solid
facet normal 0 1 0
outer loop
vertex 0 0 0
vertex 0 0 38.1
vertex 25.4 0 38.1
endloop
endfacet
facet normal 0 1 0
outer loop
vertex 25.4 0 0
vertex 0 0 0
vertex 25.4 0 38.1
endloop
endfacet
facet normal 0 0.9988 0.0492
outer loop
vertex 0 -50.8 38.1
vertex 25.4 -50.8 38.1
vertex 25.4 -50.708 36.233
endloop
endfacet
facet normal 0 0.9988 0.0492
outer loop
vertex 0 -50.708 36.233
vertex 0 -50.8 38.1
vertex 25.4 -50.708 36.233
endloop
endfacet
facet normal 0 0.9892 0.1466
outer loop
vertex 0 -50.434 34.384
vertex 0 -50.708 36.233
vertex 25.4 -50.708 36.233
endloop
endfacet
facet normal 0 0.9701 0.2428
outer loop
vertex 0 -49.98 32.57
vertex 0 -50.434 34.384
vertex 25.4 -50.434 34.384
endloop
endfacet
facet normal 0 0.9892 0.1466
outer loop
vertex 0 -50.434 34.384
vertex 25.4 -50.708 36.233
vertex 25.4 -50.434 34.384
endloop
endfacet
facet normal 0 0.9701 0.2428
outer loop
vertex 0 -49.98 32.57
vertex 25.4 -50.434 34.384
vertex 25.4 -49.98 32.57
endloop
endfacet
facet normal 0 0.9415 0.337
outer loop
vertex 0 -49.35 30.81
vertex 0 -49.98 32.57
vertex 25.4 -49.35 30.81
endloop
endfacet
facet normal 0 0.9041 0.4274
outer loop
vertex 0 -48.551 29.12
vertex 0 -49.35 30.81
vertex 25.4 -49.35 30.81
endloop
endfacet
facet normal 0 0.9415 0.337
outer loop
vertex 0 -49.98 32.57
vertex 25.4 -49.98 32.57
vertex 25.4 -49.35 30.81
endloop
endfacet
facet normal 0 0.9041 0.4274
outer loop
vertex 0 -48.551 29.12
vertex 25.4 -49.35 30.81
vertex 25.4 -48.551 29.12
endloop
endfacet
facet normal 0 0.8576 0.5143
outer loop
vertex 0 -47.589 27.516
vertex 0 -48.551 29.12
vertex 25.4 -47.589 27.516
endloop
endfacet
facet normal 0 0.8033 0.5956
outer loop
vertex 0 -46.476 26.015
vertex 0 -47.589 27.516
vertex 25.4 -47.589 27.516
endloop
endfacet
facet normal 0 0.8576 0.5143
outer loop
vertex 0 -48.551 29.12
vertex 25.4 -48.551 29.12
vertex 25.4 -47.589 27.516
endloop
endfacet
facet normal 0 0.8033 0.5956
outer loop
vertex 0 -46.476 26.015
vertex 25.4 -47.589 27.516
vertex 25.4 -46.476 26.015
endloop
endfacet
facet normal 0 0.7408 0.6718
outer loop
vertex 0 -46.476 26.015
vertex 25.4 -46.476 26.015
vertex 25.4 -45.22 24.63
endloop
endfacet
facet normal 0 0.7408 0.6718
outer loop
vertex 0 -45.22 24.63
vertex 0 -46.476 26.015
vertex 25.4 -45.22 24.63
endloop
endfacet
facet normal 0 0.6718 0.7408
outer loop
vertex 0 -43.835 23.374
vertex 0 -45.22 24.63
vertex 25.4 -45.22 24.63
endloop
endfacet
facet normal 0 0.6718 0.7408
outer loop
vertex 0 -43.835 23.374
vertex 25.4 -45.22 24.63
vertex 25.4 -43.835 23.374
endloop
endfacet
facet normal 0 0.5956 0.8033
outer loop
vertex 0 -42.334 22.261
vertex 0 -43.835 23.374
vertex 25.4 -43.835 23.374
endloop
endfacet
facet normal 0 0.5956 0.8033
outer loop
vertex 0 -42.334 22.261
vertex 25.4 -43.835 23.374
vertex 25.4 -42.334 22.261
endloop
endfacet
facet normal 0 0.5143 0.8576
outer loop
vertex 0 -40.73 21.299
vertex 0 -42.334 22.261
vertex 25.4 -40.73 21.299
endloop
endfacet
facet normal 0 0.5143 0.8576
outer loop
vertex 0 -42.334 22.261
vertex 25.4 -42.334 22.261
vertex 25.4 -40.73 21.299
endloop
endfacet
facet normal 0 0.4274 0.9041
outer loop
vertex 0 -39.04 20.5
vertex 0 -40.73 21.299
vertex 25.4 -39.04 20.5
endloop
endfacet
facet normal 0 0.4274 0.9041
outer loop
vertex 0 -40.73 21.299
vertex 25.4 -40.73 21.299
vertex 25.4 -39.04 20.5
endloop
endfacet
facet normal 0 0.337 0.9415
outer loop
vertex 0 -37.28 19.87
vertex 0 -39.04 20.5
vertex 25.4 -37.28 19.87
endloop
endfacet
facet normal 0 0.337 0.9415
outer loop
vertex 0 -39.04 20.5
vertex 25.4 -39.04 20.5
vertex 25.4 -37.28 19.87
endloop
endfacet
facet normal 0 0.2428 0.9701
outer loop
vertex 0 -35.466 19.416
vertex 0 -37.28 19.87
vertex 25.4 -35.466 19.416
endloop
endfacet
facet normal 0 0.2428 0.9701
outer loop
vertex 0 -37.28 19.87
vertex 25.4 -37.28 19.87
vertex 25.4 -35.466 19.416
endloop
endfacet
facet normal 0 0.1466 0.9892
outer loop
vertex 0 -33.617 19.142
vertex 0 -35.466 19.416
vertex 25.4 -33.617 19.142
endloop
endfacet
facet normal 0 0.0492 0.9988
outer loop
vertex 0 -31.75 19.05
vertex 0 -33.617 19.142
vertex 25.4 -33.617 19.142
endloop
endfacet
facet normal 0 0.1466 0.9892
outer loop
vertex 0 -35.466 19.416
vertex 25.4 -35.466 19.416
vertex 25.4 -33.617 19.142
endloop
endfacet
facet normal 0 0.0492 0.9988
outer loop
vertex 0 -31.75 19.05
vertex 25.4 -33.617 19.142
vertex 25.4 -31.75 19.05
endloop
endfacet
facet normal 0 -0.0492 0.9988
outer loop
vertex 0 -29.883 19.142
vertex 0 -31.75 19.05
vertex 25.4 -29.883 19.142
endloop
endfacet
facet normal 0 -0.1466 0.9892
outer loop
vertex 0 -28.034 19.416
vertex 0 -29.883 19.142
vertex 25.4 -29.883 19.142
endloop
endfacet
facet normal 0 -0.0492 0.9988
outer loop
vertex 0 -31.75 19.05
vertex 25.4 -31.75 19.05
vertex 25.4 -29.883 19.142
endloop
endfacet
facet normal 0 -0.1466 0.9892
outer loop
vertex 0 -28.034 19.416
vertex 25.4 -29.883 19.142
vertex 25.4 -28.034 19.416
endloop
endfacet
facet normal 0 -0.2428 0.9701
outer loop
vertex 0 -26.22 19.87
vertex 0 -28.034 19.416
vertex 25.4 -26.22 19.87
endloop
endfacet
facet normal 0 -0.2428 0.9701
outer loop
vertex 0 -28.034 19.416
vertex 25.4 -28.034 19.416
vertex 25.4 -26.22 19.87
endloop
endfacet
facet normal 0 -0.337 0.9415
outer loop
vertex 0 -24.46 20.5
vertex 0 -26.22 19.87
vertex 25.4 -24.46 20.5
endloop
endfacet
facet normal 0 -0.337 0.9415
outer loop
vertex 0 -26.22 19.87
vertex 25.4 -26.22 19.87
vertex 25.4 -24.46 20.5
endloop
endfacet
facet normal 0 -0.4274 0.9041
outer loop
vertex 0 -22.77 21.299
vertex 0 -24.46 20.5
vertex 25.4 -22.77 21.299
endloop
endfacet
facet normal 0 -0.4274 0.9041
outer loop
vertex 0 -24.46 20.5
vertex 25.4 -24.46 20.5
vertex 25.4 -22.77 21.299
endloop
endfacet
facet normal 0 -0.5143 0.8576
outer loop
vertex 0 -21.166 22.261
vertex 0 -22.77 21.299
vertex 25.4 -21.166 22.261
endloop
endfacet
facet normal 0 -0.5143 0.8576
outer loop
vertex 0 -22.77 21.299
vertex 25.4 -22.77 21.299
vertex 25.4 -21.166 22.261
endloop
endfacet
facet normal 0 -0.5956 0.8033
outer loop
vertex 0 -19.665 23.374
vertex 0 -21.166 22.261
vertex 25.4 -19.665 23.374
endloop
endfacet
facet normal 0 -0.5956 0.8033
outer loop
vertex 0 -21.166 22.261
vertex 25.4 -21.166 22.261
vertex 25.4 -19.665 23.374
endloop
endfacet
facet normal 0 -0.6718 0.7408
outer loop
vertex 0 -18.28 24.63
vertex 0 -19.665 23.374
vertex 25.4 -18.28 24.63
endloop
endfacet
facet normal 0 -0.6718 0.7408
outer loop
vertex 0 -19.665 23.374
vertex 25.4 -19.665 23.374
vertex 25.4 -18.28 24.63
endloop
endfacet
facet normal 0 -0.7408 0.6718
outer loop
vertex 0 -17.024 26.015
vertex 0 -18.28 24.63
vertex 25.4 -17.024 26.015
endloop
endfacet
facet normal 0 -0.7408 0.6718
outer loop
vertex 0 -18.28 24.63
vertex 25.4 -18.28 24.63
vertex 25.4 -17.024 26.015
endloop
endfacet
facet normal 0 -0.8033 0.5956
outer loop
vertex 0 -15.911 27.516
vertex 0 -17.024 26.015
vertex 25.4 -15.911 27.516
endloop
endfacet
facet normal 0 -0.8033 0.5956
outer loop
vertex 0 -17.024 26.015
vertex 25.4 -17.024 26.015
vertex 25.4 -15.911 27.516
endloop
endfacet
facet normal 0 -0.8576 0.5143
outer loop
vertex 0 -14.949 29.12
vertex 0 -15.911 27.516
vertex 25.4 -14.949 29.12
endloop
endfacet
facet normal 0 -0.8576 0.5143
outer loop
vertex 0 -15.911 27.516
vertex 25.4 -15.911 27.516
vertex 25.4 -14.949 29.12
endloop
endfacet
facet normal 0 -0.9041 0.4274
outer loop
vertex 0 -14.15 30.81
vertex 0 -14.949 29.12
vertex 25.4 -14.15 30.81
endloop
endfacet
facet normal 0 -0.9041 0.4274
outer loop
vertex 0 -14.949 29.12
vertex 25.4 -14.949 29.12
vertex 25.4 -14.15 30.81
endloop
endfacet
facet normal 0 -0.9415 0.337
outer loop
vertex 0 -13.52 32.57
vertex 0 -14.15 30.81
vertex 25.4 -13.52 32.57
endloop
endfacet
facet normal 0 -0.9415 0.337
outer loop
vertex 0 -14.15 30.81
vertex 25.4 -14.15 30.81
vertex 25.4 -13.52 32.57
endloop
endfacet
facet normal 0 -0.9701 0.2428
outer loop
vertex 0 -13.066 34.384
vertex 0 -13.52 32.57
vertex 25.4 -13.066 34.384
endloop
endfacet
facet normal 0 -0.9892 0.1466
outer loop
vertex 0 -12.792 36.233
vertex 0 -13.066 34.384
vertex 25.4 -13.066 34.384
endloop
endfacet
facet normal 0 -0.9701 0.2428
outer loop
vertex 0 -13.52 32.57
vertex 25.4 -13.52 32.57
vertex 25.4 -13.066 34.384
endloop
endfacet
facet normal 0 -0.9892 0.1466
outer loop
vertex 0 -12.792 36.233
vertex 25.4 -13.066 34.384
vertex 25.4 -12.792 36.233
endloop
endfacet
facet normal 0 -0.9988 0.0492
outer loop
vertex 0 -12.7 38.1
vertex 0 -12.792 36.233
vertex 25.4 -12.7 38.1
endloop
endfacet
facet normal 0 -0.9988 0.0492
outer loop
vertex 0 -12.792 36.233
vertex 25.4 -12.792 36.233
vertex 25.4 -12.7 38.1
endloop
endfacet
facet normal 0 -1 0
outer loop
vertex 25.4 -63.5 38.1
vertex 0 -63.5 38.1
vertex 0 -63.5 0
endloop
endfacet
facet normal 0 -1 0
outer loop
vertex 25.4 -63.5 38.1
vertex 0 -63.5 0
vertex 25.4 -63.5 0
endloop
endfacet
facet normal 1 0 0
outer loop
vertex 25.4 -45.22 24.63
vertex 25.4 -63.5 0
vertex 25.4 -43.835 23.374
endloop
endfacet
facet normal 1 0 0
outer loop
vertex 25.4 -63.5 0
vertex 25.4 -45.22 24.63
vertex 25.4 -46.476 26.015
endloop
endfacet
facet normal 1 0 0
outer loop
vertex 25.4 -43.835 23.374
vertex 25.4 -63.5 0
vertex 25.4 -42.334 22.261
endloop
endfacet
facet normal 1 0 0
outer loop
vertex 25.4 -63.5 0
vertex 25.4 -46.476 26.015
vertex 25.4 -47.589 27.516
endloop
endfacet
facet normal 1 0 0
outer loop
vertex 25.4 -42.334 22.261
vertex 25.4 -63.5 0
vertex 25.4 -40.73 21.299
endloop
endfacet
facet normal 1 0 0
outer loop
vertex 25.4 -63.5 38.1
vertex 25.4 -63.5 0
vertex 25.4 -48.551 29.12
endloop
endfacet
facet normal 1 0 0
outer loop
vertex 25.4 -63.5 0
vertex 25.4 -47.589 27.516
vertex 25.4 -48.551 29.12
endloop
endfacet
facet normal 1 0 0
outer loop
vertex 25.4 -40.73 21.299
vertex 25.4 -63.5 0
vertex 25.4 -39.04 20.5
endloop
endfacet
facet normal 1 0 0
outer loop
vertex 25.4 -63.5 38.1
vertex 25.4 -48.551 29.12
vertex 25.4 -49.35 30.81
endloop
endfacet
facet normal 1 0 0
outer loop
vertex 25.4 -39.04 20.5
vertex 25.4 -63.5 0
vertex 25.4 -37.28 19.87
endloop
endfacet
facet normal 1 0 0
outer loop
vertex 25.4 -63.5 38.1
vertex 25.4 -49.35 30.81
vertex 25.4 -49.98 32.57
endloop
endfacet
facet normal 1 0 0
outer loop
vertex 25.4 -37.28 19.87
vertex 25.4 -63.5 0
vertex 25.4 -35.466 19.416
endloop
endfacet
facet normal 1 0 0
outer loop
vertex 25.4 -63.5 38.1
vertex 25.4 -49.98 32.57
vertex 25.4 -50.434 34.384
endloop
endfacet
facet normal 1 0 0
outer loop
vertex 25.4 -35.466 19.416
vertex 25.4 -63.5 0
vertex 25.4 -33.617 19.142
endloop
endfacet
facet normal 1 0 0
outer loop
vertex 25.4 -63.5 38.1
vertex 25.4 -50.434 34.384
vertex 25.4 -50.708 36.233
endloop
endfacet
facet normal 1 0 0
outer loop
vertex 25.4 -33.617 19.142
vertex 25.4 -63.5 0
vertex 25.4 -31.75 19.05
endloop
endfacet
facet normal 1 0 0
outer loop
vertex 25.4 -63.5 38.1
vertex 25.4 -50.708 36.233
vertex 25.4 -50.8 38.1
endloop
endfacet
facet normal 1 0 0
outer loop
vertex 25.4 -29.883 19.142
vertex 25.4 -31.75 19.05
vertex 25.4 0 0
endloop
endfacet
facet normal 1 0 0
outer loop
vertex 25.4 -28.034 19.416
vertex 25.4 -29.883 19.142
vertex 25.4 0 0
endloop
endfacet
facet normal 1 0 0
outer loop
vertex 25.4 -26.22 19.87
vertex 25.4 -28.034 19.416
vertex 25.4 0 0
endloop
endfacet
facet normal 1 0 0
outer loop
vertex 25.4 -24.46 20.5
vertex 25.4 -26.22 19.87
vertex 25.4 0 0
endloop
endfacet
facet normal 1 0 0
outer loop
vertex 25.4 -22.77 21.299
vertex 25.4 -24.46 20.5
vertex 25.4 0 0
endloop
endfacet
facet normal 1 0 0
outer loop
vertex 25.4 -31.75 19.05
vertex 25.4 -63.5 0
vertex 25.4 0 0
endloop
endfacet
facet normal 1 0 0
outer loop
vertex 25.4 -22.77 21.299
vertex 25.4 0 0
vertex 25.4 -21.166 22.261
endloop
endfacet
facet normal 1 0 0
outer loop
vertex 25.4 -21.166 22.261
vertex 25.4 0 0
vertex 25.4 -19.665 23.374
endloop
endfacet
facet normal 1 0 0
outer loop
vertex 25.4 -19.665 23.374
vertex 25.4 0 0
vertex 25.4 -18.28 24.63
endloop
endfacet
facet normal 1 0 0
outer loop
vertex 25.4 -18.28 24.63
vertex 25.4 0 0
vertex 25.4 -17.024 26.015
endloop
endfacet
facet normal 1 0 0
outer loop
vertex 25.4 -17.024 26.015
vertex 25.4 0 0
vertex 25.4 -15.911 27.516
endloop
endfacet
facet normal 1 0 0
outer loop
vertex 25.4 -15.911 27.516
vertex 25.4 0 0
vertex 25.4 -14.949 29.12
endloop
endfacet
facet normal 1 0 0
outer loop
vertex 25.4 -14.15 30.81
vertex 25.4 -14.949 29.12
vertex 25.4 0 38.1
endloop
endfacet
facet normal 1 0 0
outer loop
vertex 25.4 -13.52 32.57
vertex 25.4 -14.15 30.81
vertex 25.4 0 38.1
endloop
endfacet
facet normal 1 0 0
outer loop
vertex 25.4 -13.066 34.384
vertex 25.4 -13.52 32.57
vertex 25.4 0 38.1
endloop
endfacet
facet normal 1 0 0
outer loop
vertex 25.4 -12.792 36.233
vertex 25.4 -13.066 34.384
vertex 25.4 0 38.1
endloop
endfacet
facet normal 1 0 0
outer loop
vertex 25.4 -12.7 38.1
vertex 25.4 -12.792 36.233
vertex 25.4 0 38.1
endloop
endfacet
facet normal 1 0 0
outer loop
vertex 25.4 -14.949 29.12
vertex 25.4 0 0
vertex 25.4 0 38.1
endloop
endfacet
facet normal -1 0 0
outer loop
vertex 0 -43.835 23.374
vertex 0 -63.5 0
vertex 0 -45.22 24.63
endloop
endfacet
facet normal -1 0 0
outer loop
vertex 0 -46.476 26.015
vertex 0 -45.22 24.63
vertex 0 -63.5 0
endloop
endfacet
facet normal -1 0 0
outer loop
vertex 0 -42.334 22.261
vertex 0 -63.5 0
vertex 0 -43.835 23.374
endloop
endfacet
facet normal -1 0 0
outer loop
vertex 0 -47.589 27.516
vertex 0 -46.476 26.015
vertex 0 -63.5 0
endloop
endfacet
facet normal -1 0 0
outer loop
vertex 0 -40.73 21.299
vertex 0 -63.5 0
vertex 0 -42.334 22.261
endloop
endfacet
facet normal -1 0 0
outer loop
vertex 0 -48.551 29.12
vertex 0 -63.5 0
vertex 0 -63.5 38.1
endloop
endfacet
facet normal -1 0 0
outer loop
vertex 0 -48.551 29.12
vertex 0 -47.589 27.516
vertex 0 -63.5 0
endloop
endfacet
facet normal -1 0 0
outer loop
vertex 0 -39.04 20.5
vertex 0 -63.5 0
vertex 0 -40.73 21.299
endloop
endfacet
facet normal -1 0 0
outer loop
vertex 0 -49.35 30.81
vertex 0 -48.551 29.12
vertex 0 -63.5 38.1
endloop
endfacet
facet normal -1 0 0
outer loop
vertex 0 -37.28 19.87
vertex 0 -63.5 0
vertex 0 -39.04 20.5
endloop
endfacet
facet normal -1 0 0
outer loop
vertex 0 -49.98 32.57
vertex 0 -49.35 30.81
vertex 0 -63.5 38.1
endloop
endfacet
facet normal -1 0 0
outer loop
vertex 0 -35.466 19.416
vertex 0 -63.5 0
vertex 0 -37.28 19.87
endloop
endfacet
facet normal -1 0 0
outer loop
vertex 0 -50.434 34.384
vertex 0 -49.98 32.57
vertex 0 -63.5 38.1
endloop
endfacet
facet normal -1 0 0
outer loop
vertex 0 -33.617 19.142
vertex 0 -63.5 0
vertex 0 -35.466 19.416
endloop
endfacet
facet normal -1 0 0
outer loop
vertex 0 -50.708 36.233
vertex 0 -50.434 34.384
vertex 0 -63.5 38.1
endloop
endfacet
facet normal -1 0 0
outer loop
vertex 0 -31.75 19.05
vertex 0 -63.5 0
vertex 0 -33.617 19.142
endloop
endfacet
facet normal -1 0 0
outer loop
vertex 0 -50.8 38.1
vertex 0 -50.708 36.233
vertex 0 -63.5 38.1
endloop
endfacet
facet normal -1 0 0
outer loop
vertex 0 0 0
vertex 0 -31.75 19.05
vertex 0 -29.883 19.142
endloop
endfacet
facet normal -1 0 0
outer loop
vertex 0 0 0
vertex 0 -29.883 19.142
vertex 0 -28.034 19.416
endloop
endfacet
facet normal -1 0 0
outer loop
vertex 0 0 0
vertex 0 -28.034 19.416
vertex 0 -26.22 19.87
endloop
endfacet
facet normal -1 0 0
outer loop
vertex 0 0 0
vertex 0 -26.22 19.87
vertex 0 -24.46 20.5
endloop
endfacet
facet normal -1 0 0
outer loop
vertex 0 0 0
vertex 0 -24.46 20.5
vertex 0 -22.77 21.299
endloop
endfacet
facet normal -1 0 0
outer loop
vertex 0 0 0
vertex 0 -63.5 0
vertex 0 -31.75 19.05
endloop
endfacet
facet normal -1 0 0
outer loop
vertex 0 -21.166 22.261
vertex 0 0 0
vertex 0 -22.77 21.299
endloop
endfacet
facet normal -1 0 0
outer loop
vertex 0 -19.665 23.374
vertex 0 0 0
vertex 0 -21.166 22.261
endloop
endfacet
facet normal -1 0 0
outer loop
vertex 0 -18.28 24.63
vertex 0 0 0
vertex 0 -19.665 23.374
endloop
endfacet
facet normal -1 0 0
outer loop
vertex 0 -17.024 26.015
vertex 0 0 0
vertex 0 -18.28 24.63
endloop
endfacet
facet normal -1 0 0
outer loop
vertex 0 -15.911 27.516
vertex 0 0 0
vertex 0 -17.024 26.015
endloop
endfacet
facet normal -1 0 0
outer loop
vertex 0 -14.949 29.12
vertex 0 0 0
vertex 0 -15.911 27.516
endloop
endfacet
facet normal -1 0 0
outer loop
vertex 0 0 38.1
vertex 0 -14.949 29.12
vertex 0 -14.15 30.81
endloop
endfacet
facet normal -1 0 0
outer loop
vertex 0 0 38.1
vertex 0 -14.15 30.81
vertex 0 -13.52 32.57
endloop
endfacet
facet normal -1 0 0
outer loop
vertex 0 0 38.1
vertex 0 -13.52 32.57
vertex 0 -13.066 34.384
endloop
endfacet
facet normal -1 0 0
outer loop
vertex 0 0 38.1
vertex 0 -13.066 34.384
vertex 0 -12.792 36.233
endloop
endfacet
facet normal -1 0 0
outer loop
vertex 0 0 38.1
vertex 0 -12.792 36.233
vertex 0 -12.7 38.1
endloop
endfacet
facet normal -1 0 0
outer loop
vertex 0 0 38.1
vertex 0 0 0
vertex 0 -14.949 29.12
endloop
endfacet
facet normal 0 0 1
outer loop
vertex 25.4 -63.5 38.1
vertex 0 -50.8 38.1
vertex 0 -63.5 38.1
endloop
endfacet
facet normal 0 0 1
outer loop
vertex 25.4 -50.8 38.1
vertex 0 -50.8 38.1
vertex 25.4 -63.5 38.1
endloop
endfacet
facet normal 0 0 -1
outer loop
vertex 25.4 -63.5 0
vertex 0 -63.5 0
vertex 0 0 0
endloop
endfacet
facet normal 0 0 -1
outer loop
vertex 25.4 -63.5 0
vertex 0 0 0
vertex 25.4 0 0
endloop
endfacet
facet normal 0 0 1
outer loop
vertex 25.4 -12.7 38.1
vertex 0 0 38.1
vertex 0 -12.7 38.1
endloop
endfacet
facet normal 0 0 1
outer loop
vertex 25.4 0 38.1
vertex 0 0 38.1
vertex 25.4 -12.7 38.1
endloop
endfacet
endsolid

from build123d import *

# Parameters (mm, degrees)
F0_W     = 25.4
F0_H     = 38.1
F1_DEPTH = 63.5
F3_DEPTH = 25.4


with BuildPart() as f1:
    # F0 (on Front) → F1 (new body)
    with BuildSketch(Plane.XZ):
        with Locations((12.7, 19.05)):
            Rectangle(F0_W, F0_H)
    extrude(amount=F1_DEPTH)

    # F2 (on face) → F3 (cut)
    with BuildSketch(Plane.YZ.offset(25.4)):
        with BuildLine():
            ThreePointArc((-50.8, 38.1), (-31.75, 19.05), (-12.7, 38.1))
            Line((-12.7, 38.1), (-50.8, 38.1))
        make_face()
    extrude(amount=-F3_DEPTH, mode=Mode.SUBTRACT)


solid = f1.part
